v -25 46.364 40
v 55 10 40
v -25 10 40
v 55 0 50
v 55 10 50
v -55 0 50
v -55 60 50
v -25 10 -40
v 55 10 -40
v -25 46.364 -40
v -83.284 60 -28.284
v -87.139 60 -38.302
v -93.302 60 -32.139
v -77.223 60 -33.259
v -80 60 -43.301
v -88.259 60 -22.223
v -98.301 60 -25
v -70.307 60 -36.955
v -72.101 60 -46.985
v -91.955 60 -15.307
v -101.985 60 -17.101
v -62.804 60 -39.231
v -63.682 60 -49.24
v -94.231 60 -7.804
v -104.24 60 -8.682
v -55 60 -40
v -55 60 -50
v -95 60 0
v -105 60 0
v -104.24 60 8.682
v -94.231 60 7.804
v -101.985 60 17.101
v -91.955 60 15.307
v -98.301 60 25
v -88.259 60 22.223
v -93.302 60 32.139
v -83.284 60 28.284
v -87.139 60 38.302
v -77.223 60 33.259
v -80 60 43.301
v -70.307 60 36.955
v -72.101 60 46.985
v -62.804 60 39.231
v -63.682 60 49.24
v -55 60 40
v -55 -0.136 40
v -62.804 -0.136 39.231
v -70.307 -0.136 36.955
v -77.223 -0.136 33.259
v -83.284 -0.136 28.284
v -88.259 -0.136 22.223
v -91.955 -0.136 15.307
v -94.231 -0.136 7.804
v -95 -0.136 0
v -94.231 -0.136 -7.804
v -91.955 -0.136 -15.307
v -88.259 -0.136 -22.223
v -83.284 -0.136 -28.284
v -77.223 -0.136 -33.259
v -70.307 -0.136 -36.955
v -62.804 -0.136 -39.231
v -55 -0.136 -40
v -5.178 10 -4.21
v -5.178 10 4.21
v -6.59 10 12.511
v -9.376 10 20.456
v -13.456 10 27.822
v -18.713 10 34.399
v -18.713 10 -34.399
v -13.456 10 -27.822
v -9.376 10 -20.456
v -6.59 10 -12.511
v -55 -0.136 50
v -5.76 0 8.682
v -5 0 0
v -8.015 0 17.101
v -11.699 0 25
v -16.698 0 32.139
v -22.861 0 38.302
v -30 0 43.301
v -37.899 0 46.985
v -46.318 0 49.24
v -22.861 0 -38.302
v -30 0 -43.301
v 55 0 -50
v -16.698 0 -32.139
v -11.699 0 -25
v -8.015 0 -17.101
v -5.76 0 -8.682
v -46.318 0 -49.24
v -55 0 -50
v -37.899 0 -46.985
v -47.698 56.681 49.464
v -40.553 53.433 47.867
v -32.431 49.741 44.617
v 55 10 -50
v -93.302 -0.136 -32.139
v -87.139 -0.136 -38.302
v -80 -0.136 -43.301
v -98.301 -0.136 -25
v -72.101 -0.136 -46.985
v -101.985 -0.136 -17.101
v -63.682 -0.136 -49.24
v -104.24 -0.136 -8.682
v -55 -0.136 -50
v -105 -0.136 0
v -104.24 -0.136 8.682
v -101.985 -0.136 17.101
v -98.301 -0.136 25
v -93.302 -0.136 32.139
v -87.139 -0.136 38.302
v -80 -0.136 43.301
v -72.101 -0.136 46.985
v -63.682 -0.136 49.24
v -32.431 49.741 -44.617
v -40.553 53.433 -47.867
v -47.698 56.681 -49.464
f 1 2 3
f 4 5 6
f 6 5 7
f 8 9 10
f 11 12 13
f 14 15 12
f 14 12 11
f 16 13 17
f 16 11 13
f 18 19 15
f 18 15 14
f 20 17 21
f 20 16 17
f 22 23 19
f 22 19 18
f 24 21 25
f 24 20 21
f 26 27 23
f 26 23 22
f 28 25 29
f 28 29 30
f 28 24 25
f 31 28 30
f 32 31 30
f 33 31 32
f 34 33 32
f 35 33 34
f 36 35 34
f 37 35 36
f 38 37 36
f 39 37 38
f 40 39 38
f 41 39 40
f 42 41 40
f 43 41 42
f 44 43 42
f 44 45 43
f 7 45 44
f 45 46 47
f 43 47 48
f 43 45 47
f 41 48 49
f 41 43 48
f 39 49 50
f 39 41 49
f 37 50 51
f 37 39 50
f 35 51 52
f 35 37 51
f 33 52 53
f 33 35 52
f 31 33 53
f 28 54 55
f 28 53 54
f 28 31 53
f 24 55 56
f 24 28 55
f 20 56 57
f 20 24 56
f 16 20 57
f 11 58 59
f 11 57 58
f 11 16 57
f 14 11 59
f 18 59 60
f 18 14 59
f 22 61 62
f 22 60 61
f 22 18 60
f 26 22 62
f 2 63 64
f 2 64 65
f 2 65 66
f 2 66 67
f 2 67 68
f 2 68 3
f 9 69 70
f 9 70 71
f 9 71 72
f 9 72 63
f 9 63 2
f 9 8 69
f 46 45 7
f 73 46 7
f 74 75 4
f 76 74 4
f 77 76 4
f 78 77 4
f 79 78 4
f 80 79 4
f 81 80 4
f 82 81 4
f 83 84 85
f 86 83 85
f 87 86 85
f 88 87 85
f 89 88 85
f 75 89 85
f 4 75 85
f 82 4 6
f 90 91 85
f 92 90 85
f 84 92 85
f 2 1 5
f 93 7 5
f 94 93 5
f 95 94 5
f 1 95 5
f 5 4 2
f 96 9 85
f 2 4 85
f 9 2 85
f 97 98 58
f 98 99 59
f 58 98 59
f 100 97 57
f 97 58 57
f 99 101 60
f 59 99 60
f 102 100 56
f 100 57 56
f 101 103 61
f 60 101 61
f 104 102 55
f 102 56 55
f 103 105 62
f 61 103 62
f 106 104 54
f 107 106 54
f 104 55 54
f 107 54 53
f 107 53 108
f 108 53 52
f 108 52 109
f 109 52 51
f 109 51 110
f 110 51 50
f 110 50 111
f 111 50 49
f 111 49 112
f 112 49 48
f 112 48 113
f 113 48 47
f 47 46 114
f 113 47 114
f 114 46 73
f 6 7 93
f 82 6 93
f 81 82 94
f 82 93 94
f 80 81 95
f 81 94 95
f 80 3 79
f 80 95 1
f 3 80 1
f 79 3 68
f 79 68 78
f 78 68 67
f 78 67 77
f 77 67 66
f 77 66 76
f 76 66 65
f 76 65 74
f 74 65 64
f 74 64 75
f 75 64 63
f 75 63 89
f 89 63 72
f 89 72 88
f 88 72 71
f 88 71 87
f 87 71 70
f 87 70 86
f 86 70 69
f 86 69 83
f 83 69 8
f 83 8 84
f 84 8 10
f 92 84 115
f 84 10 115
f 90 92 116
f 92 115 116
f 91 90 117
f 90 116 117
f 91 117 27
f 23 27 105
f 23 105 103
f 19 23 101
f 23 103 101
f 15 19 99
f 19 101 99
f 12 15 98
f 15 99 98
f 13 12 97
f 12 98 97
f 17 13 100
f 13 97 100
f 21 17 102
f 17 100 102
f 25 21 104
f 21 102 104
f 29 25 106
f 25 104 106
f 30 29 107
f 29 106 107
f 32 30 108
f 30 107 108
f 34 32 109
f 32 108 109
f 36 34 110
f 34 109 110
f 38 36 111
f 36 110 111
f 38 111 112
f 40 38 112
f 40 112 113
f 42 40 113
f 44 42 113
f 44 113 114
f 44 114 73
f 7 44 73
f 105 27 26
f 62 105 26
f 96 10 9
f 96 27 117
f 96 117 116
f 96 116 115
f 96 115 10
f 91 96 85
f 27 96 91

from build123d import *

# Parameters (mm, degrees)
SKETCH2_W                = 110
SKETCH2_H                = 100
BOSS_EXTRUDE1_DEPTH      = 10
BOSS_EXTRUDE2_DEPTH      = 10
BOSS_EXTRUDE3_DEPTH      = 10
BOSS_EXTRUDE4_DEPTH      = 50
BOSS_EXTRUDE4_DEPTH_BACK = 10.136488762
SKETCH5_R                = 50
CUT_EXTRUDE3_DEPTH       = 100
CUT_EXTRUDE4_DEPTH       = 100


with BuildPart() as part:
    # Sketch2 → Boss-Extrude1 (new body)
    with BuildSketch(Plane(origin=(0, 0, 0), x_dir=(1, 0, 0), z_dir=(0, 1, 0))):
        Rectangle(SKETCH2_W, SKETCH2_H)
    extrude(amount=BOSS_EXTRUDE1_DEPTH)

    # Sketch3 → Boss-Extrude2 (add)
    with BuildSketch(Plane.XY.offset(50)):
        Polygon((-55, 10), (-55, 60), (55, 10), align=None)
    extrude(amount=-BOSS_EXTRUDE2_DEPTH)

    # Sketch4 → Boss-Extrude3 (add)
    with BuildSketch(Plane(origin=(0, 0, -50), x_dir=(-1, 0, 0), z_dir=(0, 0, -1))):
        Polygon((55, 10), (55, 60), (-55, 10), align=None)
    extrude(amount=-BOSS_EXTRUDE3_DEPTH)

    # Sketch5 → Boss-Extrude4 (add, two sides: drawn at the far end of the back side and taken through both)
    with BuildSketch(Plane(origin=(0, 10, 0), x_dir=(1, 0, 0), z_dir=(0, 1, 0)).offset(-BOSS_EXTRUDE4_DEPTH_BACK)):
        with Locations(Location((-55, 0, 0), (0, 0, 270))):
            Circle(SKETCH5_R)
    extrude(amount=BOSS_EXTRUDE4_DEPTH + BOSS_EXTRUDE4_DEPTH_BACK)

    # Sketch6 → Cut-Extrude3 (cut)
    with BuildSketch(Plane(origin=(0, 60, 0), x_dir=(1, 0, 0), z_dir=(0, 1, 0))):
        with BuildLine():
            Line((-55, 50), (-55, -50))
            ThreePointArc((-55, -50), (-5, 0), (-55, 50))
        make_face()
    extrude(amount=-CUT_EXTRUDE3_DEPTH, mode=Mode.SUBTRACT)


with BuildPart() as cut_extrude3_piece_1:
    # of the separate pieces the step leaves, piece 1, a body of its own (cut_extrude3_pieces)
    add(part.part.solids().sort_by_distance((-55, -0.136488762, -50))[0])

    # Sketch7 → Cut-Extrude4 (cut)
    with BuildSketch(Plane(origin=(0, 60, 0), x_dir=(1, 0, 0), z_dir=(0, 1, 0))):
        with BuildLine():
            Line((-55, 40), (-55, -40))
            ThreePointArc((-55, -40), (-95, 0), (-55, 40))
        make_face()
    extrude(amount=-CUT_EXTRUDE4_DEPTH, mode=Mode.SUBTRACT)


with BuildPart() as cut_extrude3_piece_2:
    # of the separate pieces the step leaves, piece 2, a body of its own (cut_extrude3_pieces)
    add(part.part.solids().sort_by_distance((55, 10, -50))[0])


solid = Compound([cut_extrude3_piece_1.part, cut_extrude3_piece_2.part])
